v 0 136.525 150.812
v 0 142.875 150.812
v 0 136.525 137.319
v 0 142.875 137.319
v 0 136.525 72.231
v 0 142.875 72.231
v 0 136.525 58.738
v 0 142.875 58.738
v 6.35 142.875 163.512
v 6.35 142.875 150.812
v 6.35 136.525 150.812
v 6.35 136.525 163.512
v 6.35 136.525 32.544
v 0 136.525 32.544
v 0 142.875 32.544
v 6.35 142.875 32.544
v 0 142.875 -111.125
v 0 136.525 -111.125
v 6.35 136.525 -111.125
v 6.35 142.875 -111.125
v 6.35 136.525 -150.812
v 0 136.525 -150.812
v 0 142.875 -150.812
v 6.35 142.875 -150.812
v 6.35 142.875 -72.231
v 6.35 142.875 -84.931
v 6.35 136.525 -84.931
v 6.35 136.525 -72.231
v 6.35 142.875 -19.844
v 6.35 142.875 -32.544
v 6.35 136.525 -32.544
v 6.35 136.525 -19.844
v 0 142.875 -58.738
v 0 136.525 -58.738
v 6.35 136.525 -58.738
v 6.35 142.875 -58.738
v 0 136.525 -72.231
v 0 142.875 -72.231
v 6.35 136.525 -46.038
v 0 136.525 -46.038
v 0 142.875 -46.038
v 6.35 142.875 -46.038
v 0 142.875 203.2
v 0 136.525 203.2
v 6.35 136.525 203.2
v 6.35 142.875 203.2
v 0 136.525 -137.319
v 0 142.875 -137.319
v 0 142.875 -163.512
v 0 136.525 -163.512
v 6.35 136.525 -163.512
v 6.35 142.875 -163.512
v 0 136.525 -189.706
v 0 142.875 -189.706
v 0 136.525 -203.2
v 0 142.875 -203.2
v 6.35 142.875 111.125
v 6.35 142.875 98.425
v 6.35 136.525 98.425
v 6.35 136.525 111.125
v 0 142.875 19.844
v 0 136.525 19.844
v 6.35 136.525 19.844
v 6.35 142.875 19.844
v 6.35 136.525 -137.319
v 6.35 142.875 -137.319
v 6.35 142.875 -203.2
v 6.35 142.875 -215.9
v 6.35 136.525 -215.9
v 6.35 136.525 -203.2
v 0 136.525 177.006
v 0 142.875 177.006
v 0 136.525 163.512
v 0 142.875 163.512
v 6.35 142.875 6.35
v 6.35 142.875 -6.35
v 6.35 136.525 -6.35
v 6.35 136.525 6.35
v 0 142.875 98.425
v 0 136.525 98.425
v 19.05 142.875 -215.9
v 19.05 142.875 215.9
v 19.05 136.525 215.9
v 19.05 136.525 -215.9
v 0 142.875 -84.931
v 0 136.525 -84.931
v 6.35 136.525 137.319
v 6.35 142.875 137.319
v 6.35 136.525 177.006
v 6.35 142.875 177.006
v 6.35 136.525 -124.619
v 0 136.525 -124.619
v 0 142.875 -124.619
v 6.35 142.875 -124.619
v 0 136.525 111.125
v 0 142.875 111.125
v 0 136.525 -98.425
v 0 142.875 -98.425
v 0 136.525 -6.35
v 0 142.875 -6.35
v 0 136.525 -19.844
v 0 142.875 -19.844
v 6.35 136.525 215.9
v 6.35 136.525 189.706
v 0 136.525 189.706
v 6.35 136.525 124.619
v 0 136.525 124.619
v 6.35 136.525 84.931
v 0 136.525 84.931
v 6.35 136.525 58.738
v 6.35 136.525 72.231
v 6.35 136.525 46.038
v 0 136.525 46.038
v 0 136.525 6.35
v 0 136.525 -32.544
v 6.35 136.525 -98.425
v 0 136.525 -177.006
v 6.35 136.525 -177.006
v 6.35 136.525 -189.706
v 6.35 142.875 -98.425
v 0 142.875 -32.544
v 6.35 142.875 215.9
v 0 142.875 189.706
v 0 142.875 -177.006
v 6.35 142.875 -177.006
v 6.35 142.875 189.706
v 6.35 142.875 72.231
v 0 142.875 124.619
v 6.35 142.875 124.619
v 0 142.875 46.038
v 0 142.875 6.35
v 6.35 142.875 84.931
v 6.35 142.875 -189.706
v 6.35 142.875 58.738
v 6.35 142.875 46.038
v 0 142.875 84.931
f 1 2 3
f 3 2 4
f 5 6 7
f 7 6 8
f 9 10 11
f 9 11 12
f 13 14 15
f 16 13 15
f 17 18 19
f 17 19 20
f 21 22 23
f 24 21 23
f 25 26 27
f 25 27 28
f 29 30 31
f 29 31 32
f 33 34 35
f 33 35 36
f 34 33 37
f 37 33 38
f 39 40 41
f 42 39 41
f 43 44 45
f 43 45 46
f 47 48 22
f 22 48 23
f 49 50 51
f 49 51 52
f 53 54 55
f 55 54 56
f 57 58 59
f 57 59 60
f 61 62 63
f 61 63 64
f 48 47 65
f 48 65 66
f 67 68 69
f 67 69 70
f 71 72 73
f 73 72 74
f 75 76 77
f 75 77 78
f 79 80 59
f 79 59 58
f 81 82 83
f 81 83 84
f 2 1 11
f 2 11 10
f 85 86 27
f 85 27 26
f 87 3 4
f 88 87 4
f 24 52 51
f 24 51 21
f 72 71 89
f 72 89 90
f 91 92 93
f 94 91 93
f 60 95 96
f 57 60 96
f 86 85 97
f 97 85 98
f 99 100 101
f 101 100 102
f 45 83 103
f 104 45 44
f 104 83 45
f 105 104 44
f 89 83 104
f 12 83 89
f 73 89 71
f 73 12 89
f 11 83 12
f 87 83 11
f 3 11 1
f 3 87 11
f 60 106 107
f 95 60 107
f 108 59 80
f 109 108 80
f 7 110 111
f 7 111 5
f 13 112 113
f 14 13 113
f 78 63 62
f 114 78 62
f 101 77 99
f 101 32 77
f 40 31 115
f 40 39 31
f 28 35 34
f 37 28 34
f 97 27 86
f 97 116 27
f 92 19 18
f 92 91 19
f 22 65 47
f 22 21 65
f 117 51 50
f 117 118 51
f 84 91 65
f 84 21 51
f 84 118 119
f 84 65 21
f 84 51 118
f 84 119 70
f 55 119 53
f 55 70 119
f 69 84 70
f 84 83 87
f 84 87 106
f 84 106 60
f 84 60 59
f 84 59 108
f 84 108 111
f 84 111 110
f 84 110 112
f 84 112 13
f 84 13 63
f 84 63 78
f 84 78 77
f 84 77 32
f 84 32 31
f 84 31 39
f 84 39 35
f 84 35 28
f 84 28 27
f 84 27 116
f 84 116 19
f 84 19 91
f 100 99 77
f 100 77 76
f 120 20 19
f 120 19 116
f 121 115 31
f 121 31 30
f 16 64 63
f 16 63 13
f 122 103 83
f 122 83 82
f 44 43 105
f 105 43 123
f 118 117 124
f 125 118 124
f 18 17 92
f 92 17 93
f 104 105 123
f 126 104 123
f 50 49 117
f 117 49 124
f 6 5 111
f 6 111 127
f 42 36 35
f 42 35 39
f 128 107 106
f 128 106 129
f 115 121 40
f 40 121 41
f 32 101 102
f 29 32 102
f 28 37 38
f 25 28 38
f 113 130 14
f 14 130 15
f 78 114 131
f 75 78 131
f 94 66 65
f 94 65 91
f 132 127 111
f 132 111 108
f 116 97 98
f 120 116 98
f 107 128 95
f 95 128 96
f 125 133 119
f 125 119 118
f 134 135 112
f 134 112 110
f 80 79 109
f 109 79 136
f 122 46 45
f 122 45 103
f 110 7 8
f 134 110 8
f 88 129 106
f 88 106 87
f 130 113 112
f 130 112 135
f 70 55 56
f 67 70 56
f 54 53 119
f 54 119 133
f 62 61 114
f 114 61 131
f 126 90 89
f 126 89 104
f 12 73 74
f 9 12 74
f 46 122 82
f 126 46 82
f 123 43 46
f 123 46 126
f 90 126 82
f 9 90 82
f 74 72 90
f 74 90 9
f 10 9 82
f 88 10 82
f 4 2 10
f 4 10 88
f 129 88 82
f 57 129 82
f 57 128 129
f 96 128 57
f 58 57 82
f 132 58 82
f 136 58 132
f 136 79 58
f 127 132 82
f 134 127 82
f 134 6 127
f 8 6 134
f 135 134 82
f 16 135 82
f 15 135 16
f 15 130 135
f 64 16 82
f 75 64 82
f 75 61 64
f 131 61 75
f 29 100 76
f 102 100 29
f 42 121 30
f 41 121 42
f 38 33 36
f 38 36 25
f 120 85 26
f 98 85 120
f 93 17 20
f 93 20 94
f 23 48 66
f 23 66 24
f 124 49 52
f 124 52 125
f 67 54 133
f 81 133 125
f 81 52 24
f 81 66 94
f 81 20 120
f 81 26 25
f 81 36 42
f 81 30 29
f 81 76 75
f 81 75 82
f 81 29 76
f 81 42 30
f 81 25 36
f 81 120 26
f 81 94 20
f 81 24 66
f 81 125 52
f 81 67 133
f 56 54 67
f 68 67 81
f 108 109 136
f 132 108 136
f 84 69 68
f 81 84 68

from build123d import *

# Parameters (mm, degrees)
SKETCH1_W           = 431.8
SKETCH1_H           = 285.75
BOSS_EXTRUDE1_DEPTH = 6.35
SKETCH2_W           = 431.8
SKETCH2_H           = 6.35
BOSS_EXTRUDE2_DEPTH = 12.7
CUT_EXTRUDE1_DEPTH  = 20.05
SKETCH5_W           = 33.462355894
SKETCH5_H           = 294.779483051
CUT_EXTRUDE2_DEPTH  = 432.8
SKETCH4_W           = 12.7
SKETCH4_H           = 6.35
CUT_EXTRUDE3_DEPTH  = 6.35


with BuildPart() as part:
    # Sketch1 → Boss-Extrude1 (new body)
    with BuildSketch(Plane(origin=(0, 0, 0), x_dir=(0, 0, -1), z_dir=(1, 0, 0))):
        Rectangle(SKETCH1_W, SKETCH1_H)
    extrude(amount=BOSS_EXTRUDE1_DEPTH)

    # Sketch2 → Boss-Extrude2 (add)
    with BuildSketch(Plane(origin=(6.35, 0, 0), x_dir=(0, 0, -1), z_dir=(1, 0, 0))):
        with Locations((0, 139.7)):
            Rectangle(SKETCH2_W, SKETCH2_H)
    extrude(amount=BOSS_EXTRUDE2_DEPTH)

    # Sketch3 → Cut-Extrude1 (cut, through all)
    with BuildSketch(Plane.ZY):
        with BuildLine():
            Line((-190.5, -85.725), (0, -85.725))
            ThreePointArc((0, -85.725), (12.7, -98.425), (0, -111.125))
            Line((0, -111.125), (-190.5, -111.125))
            ThreePointArc((-190.5, -111.125), (-203.2, -98.425), (-190.5, -85.725))
        make_face()
    extrude(amount=-CUT_EXTRUDE1_DEPTH, mode=Mode.SUBTRACT)

    # Sketch5 → Cut-Extrude2 (cut, through all)
    with BuildSketch(Plane(origin=(0, 0, -215.9), x_dir=(-1, 0, 0), z_dir=(0, 0, -1))):
        with Locations((10.381177947, -10.864741526)):
            Rectangle(SKETCH5_W, SKETCH5_H)
    extrude(amount=-CUT_EXTRUDE2_DEPTH, mode=Mode.SUBTRACT)

    # Sketch4 → Cut-Extrude3 (cut)
    with BuildSketch(Plane.ZY):
        with Locations((-183.35625, 139.7)):
            Rectangle(SKETCH4_W, SKETCH4_H)
        with Locations((-209.55, 139.7)):
            Rectangle(SKETCH4_W, SKETCH4_H)
        with Locations((-157.1625, 139.7)):
            Rectangle(SKETCH4_W, SKETCH4_H)
        with Locations((-130.96875, 139.7)):
            Rectangle(SKETCH4_W, SKETCH4_H)
        with Locations((-104.775, 139.7)):
            Rectangle(SKETCH4_W, SKETCH4_H)
        with Locations((-78.58125, 139.7)):
            Rectangle(SKETCH4_W, SKETCH4_H)
        with Locations((-52.3875, 139.7)):
            Rectangle(SKETCH4_W, SKETCH4_H)
        with Locations((-26.19375, 139.7)):
            Rectangle(SKETCH4_W, SKETCH4_H)
        with Locations((0, 139.7)):
            Rectangle(SKETCH4_W, SKETCH4_H)
        with Locations((26.19375, 139.7)):
            Rectangle(SKETCH4_W, SKETCH4_H)
        with Locations((52.3875, 139.7)):
            Rectangle(SKETCH4_W, SKETCH4_H)
        with Locations((78.58125, 139.7)):
            Rectangle(SKETCH4_W, SKETCH4_H)
        with Locations((104.775, 139.7)):
            Rectangle(SKETCH4_W, SKETCH4_H)
        with Locations((130.96875, 139.7)):
            Rectangle(SKETCH4_W, SKETCH4_H)
        with Locations((157.1625, 139.7)):
            Rectangle(SKETCH4_W, SKETCH4_H)
        with Locations((183.35625, 139.7)):
            Rectangle(SKETCH4_W, SKETCH4_H)
        with Locations((209.55, 139.7)):
            Rectangle(SKETCH4_W, SKETCH4_H)
    extrude(amount=-CUT_EXTRUDE3_DEPTH, mode=Mode.SUBTRACT)


solid = part.part
